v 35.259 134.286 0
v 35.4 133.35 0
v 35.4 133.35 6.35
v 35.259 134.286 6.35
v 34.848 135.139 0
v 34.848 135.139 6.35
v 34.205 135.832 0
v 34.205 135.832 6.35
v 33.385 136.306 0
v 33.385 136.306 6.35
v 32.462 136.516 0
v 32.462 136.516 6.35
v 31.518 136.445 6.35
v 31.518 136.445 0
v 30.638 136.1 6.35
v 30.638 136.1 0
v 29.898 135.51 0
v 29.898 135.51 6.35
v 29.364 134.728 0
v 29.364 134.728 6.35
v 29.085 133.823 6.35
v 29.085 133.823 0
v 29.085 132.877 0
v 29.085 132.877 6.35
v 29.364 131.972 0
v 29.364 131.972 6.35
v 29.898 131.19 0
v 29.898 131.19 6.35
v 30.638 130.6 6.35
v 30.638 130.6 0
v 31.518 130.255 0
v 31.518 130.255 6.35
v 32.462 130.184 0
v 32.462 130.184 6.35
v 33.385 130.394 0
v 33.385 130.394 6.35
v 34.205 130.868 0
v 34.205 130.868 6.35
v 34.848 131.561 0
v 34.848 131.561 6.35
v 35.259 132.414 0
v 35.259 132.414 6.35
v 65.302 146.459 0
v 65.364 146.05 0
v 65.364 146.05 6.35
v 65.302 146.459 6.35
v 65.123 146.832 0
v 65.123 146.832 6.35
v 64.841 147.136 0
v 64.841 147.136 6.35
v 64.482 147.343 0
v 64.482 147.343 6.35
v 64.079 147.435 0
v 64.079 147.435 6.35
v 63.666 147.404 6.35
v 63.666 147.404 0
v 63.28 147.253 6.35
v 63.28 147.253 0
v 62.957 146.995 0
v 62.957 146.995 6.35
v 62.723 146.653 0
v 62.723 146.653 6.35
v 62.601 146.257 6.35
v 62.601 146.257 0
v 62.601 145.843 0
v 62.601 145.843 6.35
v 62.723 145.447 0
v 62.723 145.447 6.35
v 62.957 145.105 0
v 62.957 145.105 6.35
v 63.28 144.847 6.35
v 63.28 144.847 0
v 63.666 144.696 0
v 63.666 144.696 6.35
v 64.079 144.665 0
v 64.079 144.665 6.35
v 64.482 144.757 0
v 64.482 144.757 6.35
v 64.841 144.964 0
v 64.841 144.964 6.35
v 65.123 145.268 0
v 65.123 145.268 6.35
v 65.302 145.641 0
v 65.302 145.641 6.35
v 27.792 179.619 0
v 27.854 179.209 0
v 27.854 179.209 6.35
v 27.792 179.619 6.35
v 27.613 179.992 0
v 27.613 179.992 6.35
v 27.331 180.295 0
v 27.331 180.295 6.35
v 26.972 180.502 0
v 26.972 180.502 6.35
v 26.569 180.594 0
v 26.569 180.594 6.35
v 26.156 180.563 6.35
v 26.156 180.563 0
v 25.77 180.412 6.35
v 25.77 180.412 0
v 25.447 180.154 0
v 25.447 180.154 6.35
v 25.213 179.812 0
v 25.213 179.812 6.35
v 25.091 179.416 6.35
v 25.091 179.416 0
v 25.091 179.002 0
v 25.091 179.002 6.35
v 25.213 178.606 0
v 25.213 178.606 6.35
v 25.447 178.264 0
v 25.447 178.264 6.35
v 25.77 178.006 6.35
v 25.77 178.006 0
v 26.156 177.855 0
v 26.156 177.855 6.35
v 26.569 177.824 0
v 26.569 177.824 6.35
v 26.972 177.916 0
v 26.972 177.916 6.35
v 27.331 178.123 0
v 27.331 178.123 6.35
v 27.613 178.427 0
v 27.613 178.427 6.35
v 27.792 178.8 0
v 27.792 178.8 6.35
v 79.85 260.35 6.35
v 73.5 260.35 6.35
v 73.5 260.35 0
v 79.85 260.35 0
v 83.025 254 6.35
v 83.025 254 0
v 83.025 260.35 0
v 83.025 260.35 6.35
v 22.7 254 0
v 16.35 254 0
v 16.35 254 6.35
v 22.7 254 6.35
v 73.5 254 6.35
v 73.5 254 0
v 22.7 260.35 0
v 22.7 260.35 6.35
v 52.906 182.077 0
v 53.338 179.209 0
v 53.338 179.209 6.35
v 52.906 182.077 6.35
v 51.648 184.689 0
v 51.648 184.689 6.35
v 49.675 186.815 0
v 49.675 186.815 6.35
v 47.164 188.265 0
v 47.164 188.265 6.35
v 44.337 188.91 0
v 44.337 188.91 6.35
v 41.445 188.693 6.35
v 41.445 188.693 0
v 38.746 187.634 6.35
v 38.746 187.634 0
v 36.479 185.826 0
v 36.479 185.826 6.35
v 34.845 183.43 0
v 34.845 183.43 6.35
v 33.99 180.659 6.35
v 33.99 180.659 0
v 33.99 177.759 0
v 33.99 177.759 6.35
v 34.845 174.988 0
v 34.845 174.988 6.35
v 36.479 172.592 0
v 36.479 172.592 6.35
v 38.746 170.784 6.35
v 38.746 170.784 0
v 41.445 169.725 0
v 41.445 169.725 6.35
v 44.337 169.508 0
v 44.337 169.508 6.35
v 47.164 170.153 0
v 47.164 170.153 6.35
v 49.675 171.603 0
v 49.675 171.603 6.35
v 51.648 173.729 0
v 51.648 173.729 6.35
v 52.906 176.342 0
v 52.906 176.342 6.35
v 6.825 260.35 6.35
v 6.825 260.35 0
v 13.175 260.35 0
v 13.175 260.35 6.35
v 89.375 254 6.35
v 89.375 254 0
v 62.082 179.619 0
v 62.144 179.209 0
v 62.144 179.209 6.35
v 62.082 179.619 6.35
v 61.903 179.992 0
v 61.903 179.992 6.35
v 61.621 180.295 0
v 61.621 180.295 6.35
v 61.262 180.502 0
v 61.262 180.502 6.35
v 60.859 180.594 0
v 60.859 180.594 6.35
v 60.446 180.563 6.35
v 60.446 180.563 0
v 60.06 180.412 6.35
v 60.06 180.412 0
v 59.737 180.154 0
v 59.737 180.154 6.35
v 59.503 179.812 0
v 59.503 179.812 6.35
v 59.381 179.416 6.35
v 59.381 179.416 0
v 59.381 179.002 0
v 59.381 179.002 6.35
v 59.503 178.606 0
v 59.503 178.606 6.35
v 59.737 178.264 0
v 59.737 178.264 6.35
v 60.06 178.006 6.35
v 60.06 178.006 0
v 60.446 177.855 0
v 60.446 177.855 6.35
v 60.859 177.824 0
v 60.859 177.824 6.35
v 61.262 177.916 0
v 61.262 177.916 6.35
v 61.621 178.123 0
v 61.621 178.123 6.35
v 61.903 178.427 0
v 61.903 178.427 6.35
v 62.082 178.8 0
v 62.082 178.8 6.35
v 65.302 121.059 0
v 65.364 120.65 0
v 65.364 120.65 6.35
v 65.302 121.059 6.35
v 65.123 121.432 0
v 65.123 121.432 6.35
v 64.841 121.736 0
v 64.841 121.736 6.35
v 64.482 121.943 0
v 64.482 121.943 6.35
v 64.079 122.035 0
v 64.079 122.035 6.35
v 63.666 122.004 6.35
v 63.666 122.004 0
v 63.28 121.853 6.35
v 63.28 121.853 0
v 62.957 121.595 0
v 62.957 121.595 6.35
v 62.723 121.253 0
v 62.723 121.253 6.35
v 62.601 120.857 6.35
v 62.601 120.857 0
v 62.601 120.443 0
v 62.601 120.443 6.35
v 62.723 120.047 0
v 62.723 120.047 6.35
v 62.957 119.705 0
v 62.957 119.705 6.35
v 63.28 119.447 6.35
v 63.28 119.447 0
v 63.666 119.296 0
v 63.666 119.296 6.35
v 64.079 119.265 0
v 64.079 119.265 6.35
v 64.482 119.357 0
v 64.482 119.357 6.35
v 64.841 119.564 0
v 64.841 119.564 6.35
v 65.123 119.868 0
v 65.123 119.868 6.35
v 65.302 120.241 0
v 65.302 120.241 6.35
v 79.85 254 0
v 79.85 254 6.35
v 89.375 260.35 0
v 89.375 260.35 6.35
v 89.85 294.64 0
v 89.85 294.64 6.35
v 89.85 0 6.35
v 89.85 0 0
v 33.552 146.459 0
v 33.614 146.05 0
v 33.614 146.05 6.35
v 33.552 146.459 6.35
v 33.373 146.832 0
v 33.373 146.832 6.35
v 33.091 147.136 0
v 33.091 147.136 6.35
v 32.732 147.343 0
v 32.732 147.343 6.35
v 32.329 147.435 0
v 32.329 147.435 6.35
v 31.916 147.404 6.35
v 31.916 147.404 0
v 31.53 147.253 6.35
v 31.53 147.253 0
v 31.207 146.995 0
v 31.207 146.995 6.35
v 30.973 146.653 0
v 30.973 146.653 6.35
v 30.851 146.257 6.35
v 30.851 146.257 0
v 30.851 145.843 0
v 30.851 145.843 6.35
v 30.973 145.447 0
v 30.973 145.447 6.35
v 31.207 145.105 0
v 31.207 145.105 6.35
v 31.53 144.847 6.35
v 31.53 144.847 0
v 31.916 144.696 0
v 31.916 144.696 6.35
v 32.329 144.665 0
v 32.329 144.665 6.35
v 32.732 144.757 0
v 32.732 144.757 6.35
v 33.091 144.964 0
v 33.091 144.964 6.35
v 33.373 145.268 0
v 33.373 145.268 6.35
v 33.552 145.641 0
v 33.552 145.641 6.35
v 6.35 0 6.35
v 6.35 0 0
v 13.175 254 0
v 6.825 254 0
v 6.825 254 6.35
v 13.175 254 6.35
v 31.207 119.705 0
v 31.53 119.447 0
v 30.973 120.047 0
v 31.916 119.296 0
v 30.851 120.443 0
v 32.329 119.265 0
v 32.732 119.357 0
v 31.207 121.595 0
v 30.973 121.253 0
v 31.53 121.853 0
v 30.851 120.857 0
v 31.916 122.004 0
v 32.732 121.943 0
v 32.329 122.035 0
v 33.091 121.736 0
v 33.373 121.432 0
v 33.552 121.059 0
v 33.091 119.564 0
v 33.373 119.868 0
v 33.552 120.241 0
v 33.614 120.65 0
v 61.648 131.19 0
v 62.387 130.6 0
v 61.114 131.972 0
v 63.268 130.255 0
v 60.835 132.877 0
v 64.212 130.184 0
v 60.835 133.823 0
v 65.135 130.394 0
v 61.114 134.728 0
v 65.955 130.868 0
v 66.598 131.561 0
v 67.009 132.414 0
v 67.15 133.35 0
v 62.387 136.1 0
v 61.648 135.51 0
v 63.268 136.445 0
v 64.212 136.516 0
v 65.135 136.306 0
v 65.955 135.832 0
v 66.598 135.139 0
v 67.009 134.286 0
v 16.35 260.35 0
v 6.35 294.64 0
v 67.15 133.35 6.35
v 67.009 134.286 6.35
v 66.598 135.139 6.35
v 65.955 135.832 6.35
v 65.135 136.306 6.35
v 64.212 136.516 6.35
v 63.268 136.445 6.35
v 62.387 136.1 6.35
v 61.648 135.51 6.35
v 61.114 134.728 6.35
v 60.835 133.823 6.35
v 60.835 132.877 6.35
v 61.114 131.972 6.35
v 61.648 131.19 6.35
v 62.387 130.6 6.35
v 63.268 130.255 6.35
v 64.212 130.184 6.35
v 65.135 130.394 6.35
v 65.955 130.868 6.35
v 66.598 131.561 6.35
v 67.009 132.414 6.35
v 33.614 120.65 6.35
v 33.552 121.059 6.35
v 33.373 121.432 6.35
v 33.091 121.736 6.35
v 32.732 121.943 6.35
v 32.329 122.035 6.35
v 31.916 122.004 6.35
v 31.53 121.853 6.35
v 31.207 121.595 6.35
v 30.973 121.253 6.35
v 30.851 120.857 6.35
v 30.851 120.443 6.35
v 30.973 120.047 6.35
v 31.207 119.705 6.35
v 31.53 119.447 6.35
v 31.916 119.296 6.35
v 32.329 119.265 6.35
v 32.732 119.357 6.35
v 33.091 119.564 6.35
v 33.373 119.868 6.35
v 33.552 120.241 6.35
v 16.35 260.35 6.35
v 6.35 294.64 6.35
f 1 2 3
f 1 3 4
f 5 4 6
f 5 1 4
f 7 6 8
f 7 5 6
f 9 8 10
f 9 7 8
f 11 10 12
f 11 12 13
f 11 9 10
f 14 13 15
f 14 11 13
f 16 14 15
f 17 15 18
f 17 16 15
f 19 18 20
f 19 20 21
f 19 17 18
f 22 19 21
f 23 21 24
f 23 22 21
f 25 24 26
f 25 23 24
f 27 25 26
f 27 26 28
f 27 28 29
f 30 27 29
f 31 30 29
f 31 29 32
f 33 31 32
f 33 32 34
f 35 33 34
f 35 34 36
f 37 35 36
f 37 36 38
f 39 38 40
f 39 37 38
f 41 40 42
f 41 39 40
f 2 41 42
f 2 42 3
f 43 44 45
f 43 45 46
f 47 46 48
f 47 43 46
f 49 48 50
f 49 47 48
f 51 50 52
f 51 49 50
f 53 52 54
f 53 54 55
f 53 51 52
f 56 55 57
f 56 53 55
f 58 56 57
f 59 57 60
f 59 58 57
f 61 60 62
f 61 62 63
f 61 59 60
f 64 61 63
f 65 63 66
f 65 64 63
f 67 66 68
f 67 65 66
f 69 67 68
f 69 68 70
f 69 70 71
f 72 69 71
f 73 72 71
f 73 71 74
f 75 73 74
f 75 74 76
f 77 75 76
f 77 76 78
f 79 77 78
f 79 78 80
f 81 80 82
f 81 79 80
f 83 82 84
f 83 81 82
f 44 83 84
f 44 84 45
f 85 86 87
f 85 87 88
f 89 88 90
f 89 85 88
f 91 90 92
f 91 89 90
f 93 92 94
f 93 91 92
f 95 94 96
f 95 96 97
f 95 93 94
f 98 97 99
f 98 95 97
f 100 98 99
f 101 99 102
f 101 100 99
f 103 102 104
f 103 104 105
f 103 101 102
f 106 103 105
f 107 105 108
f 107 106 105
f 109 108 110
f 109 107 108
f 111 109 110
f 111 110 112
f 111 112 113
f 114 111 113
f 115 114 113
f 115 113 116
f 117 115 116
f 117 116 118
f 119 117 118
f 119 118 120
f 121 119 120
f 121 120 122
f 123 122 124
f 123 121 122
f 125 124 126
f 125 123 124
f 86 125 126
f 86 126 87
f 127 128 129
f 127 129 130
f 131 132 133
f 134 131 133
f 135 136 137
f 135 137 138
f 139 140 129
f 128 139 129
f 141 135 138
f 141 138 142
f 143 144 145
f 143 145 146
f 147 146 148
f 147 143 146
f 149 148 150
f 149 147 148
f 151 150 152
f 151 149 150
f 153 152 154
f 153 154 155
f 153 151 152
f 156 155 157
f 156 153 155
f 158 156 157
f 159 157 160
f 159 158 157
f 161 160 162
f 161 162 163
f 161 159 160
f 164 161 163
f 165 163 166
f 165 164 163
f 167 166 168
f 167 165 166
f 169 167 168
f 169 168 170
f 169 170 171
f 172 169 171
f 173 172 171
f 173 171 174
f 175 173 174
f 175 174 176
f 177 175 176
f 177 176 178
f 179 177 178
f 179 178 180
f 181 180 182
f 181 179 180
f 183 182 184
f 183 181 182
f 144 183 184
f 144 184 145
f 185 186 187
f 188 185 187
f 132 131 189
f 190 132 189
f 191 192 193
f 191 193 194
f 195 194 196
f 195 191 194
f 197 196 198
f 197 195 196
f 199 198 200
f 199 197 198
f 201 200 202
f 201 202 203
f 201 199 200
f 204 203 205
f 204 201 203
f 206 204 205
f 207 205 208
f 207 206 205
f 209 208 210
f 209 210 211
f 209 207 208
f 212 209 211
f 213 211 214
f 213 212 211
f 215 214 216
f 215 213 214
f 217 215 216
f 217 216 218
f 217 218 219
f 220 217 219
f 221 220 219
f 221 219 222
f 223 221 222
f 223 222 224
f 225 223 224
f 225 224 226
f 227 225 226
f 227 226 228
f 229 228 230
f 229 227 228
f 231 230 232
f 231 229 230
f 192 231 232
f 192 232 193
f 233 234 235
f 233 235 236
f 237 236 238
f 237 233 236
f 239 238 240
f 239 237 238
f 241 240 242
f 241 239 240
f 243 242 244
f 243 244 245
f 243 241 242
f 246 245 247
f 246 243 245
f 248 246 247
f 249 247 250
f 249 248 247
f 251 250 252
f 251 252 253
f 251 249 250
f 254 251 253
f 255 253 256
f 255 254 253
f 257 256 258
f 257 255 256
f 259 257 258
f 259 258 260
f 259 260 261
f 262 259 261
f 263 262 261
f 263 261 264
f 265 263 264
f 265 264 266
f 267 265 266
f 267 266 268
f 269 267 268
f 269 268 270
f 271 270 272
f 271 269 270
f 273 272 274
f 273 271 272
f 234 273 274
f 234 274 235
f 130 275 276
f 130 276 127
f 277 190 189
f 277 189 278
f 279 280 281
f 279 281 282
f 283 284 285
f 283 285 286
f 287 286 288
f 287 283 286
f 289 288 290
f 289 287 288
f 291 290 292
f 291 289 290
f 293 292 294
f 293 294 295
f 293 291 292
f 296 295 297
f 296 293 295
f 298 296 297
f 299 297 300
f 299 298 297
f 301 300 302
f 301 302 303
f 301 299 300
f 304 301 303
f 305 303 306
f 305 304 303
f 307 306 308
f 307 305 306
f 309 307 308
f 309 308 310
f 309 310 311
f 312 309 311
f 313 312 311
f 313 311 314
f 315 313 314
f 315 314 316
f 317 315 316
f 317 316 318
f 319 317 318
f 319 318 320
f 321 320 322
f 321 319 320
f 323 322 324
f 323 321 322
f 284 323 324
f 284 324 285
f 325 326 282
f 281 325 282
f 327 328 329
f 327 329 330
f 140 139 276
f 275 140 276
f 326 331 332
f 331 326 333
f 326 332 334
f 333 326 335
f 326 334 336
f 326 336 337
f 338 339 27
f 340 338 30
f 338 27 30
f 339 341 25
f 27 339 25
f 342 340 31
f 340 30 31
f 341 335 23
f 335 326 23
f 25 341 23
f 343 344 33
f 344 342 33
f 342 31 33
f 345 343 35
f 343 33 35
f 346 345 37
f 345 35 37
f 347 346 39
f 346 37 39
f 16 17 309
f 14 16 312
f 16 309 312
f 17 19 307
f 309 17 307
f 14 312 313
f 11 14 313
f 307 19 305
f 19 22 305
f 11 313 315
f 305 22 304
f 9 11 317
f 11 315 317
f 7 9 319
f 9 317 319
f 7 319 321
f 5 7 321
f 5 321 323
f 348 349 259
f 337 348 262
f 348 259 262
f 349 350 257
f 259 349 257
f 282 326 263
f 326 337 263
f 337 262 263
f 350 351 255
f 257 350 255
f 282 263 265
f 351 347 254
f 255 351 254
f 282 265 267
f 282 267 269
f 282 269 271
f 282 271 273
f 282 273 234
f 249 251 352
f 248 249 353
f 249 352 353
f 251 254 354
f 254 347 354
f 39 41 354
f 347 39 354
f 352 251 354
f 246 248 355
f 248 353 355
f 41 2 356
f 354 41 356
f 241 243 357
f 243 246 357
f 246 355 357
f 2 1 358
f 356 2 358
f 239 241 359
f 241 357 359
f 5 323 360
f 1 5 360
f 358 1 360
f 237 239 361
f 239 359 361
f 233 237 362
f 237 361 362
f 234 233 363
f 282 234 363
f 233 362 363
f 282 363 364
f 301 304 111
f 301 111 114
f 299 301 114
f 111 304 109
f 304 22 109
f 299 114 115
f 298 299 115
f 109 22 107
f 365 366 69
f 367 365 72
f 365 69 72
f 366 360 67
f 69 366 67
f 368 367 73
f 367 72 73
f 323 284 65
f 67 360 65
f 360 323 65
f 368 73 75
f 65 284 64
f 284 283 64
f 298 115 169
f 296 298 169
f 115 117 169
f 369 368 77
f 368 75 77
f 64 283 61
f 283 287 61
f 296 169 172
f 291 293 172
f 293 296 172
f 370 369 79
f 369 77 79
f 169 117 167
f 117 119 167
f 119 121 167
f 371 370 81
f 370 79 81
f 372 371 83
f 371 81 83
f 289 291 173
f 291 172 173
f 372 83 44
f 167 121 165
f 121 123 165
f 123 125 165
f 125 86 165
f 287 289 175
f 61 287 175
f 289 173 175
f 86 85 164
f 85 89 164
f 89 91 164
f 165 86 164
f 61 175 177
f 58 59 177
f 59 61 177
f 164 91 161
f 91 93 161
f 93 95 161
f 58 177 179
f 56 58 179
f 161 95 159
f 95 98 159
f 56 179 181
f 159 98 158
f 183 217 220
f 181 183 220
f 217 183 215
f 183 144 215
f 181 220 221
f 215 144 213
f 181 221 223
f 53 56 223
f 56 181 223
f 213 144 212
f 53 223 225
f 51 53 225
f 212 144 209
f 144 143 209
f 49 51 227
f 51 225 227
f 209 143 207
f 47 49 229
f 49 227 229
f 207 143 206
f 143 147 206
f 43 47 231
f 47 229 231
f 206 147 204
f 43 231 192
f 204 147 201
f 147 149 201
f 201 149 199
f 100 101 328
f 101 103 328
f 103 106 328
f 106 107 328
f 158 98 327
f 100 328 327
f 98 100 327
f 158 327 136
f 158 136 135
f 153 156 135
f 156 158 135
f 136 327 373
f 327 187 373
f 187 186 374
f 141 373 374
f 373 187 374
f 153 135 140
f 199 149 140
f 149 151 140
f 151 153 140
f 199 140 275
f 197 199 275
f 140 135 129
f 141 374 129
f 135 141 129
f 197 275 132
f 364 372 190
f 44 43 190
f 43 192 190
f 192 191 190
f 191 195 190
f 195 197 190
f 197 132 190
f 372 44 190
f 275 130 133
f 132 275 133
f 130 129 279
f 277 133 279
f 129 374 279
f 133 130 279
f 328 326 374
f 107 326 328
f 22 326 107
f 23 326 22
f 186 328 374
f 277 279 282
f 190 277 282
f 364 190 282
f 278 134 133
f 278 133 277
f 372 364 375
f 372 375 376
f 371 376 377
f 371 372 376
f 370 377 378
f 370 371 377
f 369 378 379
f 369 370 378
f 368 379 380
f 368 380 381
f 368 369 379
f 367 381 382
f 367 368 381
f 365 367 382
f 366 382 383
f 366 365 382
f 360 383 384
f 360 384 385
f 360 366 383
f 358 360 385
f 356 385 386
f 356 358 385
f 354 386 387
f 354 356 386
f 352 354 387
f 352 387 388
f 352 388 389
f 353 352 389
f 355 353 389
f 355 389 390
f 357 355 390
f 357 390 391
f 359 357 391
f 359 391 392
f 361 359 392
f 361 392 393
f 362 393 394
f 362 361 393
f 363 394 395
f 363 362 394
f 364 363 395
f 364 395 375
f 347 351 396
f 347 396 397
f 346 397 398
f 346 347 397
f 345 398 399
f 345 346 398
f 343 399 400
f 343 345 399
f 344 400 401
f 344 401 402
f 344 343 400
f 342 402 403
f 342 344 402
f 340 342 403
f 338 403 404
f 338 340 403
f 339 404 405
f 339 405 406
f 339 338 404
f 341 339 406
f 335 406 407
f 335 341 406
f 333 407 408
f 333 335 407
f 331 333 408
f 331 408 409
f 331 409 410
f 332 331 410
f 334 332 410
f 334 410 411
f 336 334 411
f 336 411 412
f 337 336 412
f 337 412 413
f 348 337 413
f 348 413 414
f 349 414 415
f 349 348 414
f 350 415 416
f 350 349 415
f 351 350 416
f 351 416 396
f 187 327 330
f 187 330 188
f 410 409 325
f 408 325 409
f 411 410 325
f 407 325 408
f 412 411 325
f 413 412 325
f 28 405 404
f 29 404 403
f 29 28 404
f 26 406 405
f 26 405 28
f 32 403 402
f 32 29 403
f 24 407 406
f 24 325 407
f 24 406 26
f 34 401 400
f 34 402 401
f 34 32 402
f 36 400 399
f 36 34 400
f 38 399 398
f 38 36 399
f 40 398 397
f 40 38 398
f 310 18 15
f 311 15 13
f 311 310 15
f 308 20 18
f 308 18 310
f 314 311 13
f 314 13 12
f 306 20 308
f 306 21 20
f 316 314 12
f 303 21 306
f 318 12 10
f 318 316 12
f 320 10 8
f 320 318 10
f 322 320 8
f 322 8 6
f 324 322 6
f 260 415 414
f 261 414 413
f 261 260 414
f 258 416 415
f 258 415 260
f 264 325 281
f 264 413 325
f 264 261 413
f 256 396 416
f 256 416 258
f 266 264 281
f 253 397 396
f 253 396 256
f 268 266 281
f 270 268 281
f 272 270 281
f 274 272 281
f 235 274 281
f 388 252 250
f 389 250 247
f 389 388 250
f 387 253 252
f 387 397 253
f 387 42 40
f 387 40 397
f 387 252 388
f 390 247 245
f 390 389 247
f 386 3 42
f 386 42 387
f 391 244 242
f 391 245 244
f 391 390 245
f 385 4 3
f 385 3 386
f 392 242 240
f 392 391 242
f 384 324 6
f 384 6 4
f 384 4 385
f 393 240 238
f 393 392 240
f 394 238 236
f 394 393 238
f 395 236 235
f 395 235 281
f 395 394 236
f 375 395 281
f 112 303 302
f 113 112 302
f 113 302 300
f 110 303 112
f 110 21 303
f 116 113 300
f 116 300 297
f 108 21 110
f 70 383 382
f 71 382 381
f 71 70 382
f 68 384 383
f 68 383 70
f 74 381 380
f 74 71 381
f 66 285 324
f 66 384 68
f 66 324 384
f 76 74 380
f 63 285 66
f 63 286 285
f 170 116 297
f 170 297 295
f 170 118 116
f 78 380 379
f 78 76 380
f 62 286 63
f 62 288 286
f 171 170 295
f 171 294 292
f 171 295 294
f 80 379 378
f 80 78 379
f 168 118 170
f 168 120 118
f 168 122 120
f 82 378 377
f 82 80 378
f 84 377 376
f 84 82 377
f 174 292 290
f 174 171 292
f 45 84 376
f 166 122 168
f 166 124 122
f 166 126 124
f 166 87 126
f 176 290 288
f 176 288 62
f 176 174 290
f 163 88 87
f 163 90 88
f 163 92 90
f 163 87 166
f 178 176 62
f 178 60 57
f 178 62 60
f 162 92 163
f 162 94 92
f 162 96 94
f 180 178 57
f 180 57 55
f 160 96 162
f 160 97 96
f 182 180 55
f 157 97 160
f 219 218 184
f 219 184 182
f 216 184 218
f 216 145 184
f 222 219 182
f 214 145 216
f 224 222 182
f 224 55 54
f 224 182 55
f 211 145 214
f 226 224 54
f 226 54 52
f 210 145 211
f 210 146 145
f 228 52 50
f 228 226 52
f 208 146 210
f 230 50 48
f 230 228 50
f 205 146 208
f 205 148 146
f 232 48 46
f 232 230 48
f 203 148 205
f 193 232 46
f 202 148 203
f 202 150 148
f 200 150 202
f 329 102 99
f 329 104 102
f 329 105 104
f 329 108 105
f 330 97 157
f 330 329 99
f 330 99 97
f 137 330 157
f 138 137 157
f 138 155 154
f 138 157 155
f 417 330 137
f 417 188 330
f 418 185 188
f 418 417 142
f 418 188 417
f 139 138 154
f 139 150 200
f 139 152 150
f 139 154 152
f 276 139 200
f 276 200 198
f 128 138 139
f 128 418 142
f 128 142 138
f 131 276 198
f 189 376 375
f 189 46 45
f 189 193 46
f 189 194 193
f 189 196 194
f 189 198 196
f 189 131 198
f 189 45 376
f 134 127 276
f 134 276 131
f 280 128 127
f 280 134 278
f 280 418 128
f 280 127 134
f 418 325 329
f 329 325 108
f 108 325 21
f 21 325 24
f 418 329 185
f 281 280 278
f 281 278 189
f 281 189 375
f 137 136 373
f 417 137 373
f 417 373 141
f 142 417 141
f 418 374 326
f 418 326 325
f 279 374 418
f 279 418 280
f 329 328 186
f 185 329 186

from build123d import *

# Parameters (mm, degrees)
SKETCH1_W           = 96.2
SKETCH1_H           = 294.64
SKETCH1_R           = 1.3890625
SKETCH1_R_2         = 3.175
SKETCH1_R_3         = 9.7282
SKETCH1_W_2         = 6.35
SKETCH1_H_2         = 6.35
BOSS_EXTRUDE1_DEPTH = 6.35
SKETCH3_W           = 6.35
SKETCH3_H           = 294.64
CUT_EXTRUDE2_DEPTH  = 6.35
SKETCH4_W           = 6.35
SKETCH4_H           = 294.64
CUT_EXTRUDE3_DEPTH  = 6.35


with BuildPart() as part:
    # Sketch1 → Boss-Extrude1 (new body)
    with BuildSketch(Plane.XY):
        with Locations((48.1, 147.32)):
            Rectangle(SKETCH1_W, SKETCH1_H)
        with Locations((63.9749986, 120.65)):
            Circle(SKETCH1_R, mode=Mode.SUBTRACT)
        with Locations((63.9749986, 133.35)):
            Circle(SKETCH1_R_2, mode=Mode.SUBTRACT)
        with Locations((63.9749986, 146.05)):
            Circle(SKETCH1_R, mode=Mode.SUBTRACT)
        with Locations((32.2250014, 146.05)):
            Circle(SKETCH1_R, mode=Mode.SUBTRACT)
        with Locations((32.2250014, 133.35)):
            Circle(SKETCH1_R_2, mode=Mode.SUBTRACT)
        with Locations((32.2250014, 120.65)):
            Circle(SKETCH1_R, mode=Mode.SUBTRACT)
        with Locations((60.754989798, 179.209178053)):
            Circle(SKETCH1_R, mode=Mode.SUBTRACT)
        with Locations((26.464989798, 179.209178053)):
            Circle(SKETCH1_R, mode=Mode.SUBTRACT)
        with Locations((43.609989798, 179.209178053)):
            Circle(SKETCH1_R_3, mode=Mode.SUBTRACT)
        with Locations((86.2, 257.175)):
            Rectangle(SKETCH1_W_2, SKETCH1_H_2, mode=Mode.SUBTRACT)
        with Locations((76.675, 257.175)):
            Rectangle(SKETCH1_W_2, SKETCH1_H_2, mode=Mode.SUBTRACT)
        with Locations((19.525, 257.175)):
            Rectangle(SKETCH1_W_2, SKETCH1_H_2, mode=Mode.SUBTRACT)
        with Locations((10, 257.175)):
            Rectangle(SKETCH1_W_2, SKETCH1_H_2, mode=Mode.SUBTRACT)
    extrude(amount=BOSS_EXTRUDE1_DEPTH)

    # Sketch3 → Cut-Extrude2 (cut)
    with BuildSketch(Plane.ZY):
        with Locations((3.175, 147.32)):
            Rectangle(SKETCH3_W, SKETCH3_H)
    extrude(amount=-CUT_EXTRUDE2_DEPTH, mode=Mode.SUBTRACT)

    # Sketch4 → Cut-Extrude3 (cut)
    with BuildSketch(Plane(origin=(96.2, 0, 0), x_dir=(0, 0, -1), z_dir=(1, 0, 0))):
        with Locations((-3.175, 147.32)):
            Rectangle(SKETCH4_W, SKETCH4_H)
    extrude(amount=-CUT_EXTRUDE3_DEPTH, mode=Mode.SUBTRACT)


solid = part.part
